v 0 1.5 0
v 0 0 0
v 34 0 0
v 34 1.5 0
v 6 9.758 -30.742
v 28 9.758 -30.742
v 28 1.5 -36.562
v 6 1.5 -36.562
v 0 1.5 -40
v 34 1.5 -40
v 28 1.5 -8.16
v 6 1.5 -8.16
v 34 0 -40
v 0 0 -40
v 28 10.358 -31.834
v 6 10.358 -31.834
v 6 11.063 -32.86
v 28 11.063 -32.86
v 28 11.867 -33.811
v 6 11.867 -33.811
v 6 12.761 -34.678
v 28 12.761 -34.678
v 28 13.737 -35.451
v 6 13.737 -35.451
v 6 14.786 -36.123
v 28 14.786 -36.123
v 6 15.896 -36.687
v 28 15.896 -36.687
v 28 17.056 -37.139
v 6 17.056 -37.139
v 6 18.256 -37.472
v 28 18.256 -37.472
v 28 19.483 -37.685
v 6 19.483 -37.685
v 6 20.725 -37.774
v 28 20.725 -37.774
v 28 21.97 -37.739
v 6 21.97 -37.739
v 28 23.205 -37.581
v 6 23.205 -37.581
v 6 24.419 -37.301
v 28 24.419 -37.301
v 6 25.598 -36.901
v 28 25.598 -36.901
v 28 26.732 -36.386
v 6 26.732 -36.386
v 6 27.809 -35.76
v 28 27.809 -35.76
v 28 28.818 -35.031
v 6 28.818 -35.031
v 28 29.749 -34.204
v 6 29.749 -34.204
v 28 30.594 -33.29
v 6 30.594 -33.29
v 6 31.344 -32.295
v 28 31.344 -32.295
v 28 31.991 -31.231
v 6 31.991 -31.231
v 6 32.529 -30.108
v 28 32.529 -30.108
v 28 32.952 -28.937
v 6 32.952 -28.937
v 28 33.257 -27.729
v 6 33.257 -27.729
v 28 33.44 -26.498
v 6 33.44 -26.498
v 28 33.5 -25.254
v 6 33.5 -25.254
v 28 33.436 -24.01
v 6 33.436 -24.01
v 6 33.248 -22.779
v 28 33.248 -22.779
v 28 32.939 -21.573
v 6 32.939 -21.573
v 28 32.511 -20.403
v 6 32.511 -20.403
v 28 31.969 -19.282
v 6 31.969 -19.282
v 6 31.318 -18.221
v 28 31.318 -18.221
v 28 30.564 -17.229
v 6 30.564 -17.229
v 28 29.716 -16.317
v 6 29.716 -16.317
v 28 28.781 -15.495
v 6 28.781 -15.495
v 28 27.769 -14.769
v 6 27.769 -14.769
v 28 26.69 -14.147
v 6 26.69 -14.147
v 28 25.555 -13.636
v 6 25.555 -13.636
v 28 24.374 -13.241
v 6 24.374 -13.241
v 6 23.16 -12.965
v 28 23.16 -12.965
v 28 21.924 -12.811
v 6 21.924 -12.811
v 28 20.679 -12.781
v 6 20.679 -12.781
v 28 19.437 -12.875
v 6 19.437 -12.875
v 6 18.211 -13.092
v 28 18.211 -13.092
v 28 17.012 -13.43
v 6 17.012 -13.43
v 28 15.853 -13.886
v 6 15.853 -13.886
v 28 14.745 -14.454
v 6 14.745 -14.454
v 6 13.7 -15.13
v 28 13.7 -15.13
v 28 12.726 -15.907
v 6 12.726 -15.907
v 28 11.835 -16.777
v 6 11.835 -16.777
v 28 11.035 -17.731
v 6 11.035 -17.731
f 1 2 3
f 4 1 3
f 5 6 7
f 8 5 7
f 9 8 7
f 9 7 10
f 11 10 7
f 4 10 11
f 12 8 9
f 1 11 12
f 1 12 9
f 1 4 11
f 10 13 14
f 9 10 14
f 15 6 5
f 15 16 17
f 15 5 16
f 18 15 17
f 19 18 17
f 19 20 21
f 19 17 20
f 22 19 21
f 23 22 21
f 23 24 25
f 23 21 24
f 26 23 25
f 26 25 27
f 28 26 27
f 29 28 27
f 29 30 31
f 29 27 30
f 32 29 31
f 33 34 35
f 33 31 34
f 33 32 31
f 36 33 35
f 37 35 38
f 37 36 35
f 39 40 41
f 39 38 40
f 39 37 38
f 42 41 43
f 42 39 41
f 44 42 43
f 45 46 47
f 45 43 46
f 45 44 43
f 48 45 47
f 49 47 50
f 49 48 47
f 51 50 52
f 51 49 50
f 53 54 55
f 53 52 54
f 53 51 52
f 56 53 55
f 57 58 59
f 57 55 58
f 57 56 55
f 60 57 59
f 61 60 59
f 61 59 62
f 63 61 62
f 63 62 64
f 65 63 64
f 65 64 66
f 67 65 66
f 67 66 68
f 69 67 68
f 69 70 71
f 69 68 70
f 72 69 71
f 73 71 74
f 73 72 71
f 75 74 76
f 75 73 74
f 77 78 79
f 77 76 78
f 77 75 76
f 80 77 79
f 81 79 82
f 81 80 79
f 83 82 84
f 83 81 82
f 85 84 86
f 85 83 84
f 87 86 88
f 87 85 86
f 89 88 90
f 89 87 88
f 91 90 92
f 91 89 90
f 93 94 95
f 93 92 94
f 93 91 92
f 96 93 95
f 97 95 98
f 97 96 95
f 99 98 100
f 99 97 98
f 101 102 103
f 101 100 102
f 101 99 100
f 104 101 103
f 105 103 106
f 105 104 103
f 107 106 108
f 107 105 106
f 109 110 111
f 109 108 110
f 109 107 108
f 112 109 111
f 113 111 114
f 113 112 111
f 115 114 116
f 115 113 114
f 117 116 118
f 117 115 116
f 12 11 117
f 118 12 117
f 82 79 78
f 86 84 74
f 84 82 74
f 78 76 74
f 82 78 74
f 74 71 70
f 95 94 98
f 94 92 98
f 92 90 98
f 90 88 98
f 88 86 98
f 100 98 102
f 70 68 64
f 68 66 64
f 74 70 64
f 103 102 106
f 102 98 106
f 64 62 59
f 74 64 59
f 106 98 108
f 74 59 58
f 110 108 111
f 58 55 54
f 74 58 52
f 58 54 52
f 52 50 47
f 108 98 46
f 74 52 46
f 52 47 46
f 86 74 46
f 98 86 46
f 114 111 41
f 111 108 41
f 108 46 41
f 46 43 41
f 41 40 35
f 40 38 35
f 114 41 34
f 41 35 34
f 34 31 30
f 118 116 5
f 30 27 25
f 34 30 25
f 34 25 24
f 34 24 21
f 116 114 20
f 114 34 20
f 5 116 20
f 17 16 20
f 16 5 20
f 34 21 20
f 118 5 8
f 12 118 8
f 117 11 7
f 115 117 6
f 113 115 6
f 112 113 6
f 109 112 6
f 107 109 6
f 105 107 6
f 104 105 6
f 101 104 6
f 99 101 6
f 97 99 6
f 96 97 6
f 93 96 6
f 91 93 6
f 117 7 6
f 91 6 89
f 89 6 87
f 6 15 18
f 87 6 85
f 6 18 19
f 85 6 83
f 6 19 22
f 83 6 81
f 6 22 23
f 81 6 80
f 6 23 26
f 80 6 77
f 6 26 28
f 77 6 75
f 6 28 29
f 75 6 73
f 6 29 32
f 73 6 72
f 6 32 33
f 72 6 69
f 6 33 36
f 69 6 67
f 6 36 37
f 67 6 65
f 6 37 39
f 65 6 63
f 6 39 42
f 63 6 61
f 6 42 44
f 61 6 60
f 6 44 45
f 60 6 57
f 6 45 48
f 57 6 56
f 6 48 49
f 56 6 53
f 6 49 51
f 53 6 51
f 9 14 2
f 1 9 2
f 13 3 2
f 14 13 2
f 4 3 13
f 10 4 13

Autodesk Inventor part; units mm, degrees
ref_plane "YZ Plane" through (0, 0, 0) normal (1, 0, 0) x (0, 1, 0)
ref_plane "XZ Plane" through (0, 0, 0) normal (0, 1, 0) x (-1, 0, 0)
ref_plane "XY Plane" through (0, 0, 0) normal (0, 0, 1) x (1, 0, 0)
sketch "Sketch1" plane through (0, 0, 0) normal (0, 1, 0) x (-1, 0, 0)
  line L0 (0, 0) -> (-34, 0)
  line L1 (-34, 0) -> (-34, -40)
  line L2 (-34, -40) -> (0, -40)
  line L3 (0, -40) -> (0, 0)
  dimension "d0" = 40
  dimension "d1" = 34
extrude "Extrusion1" add sketch "Sketch1" along normal blind 1.5
sketch "Sketch2" plane through (34, 0, 0) normal (1, 0, 0) x (0, 0, -1)
  line L0 (0, 1.5) -> (40, 1.5) projected
  line L1 (8.1604, 1.5) -> (27.7337, 21)
  line L2 (27.7337, 21) -> (22.8205, 21)
  line L3 (22.8205, 21) -> (36.5617, 1.5)
  circle A0 centre (25.2771, 21) radius 12.5
  line L4 (0, 0) -> (40, 0) projected
  point P0 (17.731, 11.0347)
  point P1 (30.7424, 9.7581)
  dimension "d4" = 25
  dimension "d5" = 21
extrude "Extrusion2" add sketch "Sketch2" against normal up to surface (34 mm away) contours L1 A0 L3 L0 | L3 L2 L1 | A0 L3 L1 | L1 L3 A0
sketch "Sketch3" plane through (34, 0, -40) normal (0, 0, -1) x (-1, 0, 0)
  line L0 (34, 1.5) -> (0, 1.5) projected
  line L1 (0, 33.5) -> (34, 33.5) projected
  line L2 (0, 1.5) -> (6, 1.5)
  line L3 (6, 1.5) -> (6, 33.5)
  line L4 (6, 33.5) -> (0, 33.5)
  line L5 (0, 33.5) -> (0, 1.5)
  line L6 (34, 33.5) -> (28, 33.5)
  line L7 (28, 33.5) -> (28, 1.5)
  line L8 (28, 1.5) -> (34, 1.5)
  line L9 (34, 1.5) -> (34, 33.5)
  point P0 (34, 0)
  point P1 (28, 1.5)
  dimension "d8" = 6
  dimension "d9" = 6
extrude "Extrusion3" cut sketch "Sketch3" against normal through all contours L0 L7 L1 L9 | L0 L5 L1 L3
properties part number "Rueda loca"
